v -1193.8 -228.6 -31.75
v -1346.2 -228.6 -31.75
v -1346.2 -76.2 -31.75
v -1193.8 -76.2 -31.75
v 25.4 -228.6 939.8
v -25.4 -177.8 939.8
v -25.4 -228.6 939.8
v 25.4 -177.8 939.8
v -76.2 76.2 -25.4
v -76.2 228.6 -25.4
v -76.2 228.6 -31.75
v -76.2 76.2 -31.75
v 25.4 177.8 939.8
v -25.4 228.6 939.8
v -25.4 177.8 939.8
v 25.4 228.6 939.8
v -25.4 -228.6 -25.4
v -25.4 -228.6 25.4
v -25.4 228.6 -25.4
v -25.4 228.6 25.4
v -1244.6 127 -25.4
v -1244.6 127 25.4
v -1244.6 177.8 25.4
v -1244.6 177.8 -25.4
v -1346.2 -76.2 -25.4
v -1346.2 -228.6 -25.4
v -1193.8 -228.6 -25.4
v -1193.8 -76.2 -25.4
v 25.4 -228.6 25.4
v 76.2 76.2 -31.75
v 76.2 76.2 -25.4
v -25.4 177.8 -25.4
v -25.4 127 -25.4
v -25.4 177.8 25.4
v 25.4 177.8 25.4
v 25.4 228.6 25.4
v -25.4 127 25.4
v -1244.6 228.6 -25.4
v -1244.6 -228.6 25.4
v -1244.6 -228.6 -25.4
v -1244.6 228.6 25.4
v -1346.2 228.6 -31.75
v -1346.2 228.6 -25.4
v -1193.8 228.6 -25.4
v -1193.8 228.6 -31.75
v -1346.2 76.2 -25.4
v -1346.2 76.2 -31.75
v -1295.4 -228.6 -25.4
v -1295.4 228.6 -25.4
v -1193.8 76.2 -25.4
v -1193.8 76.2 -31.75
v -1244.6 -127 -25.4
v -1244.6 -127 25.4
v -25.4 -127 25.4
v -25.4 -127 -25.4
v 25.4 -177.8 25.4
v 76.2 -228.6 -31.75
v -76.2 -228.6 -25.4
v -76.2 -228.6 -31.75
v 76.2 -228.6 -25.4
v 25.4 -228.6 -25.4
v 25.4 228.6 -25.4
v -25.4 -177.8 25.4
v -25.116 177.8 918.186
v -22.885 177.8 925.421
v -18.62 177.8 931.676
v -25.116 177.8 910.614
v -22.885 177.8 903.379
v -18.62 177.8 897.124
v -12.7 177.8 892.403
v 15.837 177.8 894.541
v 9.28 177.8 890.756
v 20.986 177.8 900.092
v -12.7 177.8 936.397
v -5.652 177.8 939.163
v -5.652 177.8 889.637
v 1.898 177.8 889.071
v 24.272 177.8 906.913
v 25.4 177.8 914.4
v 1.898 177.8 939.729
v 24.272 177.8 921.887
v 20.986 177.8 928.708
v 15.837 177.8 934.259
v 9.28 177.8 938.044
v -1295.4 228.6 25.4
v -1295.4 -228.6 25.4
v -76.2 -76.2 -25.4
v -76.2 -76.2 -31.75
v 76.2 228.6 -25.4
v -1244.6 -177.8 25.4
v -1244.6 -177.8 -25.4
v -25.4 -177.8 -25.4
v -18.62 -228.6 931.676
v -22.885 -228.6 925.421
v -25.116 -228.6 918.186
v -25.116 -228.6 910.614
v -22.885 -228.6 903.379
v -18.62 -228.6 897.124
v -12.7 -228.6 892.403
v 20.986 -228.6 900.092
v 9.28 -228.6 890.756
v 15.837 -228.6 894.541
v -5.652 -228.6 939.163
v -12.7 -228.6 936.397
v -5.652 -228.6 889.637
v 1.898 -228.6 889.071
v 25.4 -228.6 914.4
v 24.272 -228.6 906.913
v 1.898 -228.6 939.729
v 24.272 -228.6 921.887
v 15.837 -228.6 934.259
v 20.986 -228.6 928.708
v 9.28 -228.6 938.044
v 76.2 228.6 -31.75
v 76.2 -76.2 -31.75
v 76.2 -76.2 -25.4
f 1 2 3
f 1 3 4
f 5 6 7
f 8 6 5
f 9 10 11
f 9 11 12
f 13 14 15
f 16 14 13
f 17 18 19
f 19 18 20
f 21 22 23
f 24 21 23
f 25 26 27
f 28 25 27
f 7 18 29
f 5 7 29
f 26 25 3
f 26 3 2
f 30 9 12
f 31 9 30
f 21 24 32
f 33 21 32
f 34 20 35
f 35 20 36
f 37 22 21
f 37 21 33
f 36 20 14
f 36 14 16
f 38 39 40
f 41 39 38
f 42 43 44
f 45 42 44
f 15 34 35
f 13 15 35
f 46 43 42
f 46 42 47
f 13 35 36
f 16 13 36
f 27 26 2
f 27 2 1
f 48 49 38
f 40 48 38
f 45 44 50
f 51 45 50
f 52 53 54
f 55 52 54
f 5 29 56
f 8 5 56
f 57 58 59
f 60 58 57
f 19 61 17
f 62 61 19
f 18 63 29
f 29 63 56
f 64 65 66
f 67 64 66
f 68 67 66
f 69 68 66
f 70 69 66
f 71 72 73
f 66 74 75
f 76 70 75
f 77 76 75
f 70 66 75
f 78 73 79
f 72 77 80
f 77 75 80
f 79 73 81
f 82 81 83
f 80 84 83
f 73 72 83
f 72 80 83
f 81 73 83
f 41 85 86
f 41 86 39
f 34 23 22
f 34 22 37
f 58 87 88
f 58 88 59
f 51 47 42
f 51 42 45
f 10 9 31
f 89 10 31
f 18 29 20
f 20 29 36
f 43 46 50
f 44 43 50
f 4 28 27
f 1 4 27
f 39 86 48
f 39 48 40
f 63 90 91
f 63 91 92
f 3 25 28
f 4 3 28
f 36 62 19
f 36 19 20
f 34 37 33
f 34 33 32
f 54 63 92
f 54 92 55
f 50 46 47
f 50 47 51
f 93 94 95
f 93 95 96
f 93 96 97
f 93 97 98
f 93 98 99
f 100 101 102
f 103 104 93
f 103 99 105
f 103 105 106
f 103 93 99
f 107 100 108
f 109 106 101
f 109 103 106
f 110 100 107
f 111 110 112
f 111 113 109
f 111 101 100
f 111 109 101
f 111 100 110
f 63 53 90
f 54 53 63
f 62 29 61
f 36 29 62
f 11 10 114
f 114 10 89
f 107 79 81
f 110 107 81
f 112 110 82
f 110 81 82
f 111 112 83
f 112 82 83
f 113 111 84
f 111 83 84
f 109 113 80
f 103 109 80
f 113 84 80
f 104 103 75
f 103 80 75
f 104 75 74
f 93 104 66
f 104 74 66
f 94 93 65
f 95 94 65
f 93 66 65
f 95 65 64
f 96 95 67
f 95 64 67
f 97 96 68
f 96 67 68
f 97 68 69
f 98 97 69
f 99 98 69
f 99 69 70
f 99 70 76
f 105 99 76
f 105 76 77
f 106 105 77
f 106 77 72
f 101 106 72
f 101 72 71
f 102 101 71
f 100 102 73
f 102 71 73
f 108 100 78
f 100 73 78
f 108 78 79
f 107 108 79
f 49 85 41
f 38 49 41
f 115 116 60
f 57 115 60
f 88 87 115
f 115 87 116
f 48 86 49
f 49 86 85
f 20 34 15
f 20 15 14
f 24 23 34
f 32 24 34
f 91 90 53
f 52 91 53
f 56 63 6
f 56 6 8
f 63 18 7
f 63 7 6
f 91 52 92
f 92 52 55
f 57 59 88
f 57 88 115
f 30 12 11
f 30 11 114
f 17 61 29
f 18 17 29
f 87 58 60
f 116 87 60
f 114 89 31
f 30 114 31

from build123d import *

# Parameters (mm, degrees)
F0_W      = 457.2
F0_H      = 50.8
F1_DEPTH  = 25.4
F2_W      = 1219.2
F2_H      = 50.8
F3_DEPTH  = 50.8
F4_W      = 50.8
F4_H      = 457.2
F5_DEPTH  = 50.8
F6_W      = 152.4
F6_H      = 152.4
F7_DEPTH  = 6.35
F8_W      = 50.8
F8_H      = 50.8
F9_DEPTH  = 914.4
F10_R     = 25.4
F11_DEPTH = 406.4


with BuildPart() as f1:
    # F0 (on Right) → F1 (new body, symmetric)
    with BuildSketch(Plane.YZ):
        Rectangle(F0_W, F0_H)
    extrude(amount=F1_DEPTH, both=True)


with BuildPart() as f3:
    # F2 (on face) → F3 (new body)
    with BuildSketch(Plane.XY.offset(25.4)):
        with Locations((-635, 152.4)):
            Rectangle(F2_W, F2_H)
        with Locations((-635, -152.4)):
            Rectangle(F2_W, F2_H)
    extrude(amount=-F3_DEPTH)


with BuildPart() as f5:
    # F4 (on face) → F5 (new body)
    with BuildSketch(Plane.XY.offset(25.4)):
        with Locations((-1270, 0)):
            Rectangle(F4_W, F4_H)
    extrude(amount=-F5_DEPTH)


with BuildPart() as f7:
    # F6 (on face) → F7 (new body)
    with BuildSketch(Plane(origin=(0, 0, -25.4), x_dir=(1, 0, 0), z_dir=(0, 0, -1))):
        with Locations((-1270, 152.4)):
            Rectangle(F6_W, F6_H)
        with Locations((-1270, -152.4)):
            Rectangle(F6_W, F6_H)
        with Locations((0, 152.4)):
            Rectangle(F6_W, F6_H)
        with Locations((0, -152.4)):
            Rectangle(F6_W, F6_H)
    extrude(amount=F7_DEPTH)


with BuildPart() as f9:
    # F8 (on face) → F9 (new body)
    with BuildSketch(Plane.XY.offset(25.4)):
        with Locations((0, -203.2)):
            Rectangle(F8_W, F8_H)
        with Locations((0, 203.2)):
            Rectangle(F8_W, F8_H)
    extrude(amount=F9_DEPTH)


with BuildPart() as f11:
    # F10 (on face) → F11 (new body)
    with BuildSketch(Plane.XZ.offset(-177.8)):
        with Locations((0, 914.4)):
            Circle(F10_R)
    extrude(amount=F11_DEPTH)


solid = Compound([f1.part, f3.part, f5.part, f7.part, f9.part, f11.part])
